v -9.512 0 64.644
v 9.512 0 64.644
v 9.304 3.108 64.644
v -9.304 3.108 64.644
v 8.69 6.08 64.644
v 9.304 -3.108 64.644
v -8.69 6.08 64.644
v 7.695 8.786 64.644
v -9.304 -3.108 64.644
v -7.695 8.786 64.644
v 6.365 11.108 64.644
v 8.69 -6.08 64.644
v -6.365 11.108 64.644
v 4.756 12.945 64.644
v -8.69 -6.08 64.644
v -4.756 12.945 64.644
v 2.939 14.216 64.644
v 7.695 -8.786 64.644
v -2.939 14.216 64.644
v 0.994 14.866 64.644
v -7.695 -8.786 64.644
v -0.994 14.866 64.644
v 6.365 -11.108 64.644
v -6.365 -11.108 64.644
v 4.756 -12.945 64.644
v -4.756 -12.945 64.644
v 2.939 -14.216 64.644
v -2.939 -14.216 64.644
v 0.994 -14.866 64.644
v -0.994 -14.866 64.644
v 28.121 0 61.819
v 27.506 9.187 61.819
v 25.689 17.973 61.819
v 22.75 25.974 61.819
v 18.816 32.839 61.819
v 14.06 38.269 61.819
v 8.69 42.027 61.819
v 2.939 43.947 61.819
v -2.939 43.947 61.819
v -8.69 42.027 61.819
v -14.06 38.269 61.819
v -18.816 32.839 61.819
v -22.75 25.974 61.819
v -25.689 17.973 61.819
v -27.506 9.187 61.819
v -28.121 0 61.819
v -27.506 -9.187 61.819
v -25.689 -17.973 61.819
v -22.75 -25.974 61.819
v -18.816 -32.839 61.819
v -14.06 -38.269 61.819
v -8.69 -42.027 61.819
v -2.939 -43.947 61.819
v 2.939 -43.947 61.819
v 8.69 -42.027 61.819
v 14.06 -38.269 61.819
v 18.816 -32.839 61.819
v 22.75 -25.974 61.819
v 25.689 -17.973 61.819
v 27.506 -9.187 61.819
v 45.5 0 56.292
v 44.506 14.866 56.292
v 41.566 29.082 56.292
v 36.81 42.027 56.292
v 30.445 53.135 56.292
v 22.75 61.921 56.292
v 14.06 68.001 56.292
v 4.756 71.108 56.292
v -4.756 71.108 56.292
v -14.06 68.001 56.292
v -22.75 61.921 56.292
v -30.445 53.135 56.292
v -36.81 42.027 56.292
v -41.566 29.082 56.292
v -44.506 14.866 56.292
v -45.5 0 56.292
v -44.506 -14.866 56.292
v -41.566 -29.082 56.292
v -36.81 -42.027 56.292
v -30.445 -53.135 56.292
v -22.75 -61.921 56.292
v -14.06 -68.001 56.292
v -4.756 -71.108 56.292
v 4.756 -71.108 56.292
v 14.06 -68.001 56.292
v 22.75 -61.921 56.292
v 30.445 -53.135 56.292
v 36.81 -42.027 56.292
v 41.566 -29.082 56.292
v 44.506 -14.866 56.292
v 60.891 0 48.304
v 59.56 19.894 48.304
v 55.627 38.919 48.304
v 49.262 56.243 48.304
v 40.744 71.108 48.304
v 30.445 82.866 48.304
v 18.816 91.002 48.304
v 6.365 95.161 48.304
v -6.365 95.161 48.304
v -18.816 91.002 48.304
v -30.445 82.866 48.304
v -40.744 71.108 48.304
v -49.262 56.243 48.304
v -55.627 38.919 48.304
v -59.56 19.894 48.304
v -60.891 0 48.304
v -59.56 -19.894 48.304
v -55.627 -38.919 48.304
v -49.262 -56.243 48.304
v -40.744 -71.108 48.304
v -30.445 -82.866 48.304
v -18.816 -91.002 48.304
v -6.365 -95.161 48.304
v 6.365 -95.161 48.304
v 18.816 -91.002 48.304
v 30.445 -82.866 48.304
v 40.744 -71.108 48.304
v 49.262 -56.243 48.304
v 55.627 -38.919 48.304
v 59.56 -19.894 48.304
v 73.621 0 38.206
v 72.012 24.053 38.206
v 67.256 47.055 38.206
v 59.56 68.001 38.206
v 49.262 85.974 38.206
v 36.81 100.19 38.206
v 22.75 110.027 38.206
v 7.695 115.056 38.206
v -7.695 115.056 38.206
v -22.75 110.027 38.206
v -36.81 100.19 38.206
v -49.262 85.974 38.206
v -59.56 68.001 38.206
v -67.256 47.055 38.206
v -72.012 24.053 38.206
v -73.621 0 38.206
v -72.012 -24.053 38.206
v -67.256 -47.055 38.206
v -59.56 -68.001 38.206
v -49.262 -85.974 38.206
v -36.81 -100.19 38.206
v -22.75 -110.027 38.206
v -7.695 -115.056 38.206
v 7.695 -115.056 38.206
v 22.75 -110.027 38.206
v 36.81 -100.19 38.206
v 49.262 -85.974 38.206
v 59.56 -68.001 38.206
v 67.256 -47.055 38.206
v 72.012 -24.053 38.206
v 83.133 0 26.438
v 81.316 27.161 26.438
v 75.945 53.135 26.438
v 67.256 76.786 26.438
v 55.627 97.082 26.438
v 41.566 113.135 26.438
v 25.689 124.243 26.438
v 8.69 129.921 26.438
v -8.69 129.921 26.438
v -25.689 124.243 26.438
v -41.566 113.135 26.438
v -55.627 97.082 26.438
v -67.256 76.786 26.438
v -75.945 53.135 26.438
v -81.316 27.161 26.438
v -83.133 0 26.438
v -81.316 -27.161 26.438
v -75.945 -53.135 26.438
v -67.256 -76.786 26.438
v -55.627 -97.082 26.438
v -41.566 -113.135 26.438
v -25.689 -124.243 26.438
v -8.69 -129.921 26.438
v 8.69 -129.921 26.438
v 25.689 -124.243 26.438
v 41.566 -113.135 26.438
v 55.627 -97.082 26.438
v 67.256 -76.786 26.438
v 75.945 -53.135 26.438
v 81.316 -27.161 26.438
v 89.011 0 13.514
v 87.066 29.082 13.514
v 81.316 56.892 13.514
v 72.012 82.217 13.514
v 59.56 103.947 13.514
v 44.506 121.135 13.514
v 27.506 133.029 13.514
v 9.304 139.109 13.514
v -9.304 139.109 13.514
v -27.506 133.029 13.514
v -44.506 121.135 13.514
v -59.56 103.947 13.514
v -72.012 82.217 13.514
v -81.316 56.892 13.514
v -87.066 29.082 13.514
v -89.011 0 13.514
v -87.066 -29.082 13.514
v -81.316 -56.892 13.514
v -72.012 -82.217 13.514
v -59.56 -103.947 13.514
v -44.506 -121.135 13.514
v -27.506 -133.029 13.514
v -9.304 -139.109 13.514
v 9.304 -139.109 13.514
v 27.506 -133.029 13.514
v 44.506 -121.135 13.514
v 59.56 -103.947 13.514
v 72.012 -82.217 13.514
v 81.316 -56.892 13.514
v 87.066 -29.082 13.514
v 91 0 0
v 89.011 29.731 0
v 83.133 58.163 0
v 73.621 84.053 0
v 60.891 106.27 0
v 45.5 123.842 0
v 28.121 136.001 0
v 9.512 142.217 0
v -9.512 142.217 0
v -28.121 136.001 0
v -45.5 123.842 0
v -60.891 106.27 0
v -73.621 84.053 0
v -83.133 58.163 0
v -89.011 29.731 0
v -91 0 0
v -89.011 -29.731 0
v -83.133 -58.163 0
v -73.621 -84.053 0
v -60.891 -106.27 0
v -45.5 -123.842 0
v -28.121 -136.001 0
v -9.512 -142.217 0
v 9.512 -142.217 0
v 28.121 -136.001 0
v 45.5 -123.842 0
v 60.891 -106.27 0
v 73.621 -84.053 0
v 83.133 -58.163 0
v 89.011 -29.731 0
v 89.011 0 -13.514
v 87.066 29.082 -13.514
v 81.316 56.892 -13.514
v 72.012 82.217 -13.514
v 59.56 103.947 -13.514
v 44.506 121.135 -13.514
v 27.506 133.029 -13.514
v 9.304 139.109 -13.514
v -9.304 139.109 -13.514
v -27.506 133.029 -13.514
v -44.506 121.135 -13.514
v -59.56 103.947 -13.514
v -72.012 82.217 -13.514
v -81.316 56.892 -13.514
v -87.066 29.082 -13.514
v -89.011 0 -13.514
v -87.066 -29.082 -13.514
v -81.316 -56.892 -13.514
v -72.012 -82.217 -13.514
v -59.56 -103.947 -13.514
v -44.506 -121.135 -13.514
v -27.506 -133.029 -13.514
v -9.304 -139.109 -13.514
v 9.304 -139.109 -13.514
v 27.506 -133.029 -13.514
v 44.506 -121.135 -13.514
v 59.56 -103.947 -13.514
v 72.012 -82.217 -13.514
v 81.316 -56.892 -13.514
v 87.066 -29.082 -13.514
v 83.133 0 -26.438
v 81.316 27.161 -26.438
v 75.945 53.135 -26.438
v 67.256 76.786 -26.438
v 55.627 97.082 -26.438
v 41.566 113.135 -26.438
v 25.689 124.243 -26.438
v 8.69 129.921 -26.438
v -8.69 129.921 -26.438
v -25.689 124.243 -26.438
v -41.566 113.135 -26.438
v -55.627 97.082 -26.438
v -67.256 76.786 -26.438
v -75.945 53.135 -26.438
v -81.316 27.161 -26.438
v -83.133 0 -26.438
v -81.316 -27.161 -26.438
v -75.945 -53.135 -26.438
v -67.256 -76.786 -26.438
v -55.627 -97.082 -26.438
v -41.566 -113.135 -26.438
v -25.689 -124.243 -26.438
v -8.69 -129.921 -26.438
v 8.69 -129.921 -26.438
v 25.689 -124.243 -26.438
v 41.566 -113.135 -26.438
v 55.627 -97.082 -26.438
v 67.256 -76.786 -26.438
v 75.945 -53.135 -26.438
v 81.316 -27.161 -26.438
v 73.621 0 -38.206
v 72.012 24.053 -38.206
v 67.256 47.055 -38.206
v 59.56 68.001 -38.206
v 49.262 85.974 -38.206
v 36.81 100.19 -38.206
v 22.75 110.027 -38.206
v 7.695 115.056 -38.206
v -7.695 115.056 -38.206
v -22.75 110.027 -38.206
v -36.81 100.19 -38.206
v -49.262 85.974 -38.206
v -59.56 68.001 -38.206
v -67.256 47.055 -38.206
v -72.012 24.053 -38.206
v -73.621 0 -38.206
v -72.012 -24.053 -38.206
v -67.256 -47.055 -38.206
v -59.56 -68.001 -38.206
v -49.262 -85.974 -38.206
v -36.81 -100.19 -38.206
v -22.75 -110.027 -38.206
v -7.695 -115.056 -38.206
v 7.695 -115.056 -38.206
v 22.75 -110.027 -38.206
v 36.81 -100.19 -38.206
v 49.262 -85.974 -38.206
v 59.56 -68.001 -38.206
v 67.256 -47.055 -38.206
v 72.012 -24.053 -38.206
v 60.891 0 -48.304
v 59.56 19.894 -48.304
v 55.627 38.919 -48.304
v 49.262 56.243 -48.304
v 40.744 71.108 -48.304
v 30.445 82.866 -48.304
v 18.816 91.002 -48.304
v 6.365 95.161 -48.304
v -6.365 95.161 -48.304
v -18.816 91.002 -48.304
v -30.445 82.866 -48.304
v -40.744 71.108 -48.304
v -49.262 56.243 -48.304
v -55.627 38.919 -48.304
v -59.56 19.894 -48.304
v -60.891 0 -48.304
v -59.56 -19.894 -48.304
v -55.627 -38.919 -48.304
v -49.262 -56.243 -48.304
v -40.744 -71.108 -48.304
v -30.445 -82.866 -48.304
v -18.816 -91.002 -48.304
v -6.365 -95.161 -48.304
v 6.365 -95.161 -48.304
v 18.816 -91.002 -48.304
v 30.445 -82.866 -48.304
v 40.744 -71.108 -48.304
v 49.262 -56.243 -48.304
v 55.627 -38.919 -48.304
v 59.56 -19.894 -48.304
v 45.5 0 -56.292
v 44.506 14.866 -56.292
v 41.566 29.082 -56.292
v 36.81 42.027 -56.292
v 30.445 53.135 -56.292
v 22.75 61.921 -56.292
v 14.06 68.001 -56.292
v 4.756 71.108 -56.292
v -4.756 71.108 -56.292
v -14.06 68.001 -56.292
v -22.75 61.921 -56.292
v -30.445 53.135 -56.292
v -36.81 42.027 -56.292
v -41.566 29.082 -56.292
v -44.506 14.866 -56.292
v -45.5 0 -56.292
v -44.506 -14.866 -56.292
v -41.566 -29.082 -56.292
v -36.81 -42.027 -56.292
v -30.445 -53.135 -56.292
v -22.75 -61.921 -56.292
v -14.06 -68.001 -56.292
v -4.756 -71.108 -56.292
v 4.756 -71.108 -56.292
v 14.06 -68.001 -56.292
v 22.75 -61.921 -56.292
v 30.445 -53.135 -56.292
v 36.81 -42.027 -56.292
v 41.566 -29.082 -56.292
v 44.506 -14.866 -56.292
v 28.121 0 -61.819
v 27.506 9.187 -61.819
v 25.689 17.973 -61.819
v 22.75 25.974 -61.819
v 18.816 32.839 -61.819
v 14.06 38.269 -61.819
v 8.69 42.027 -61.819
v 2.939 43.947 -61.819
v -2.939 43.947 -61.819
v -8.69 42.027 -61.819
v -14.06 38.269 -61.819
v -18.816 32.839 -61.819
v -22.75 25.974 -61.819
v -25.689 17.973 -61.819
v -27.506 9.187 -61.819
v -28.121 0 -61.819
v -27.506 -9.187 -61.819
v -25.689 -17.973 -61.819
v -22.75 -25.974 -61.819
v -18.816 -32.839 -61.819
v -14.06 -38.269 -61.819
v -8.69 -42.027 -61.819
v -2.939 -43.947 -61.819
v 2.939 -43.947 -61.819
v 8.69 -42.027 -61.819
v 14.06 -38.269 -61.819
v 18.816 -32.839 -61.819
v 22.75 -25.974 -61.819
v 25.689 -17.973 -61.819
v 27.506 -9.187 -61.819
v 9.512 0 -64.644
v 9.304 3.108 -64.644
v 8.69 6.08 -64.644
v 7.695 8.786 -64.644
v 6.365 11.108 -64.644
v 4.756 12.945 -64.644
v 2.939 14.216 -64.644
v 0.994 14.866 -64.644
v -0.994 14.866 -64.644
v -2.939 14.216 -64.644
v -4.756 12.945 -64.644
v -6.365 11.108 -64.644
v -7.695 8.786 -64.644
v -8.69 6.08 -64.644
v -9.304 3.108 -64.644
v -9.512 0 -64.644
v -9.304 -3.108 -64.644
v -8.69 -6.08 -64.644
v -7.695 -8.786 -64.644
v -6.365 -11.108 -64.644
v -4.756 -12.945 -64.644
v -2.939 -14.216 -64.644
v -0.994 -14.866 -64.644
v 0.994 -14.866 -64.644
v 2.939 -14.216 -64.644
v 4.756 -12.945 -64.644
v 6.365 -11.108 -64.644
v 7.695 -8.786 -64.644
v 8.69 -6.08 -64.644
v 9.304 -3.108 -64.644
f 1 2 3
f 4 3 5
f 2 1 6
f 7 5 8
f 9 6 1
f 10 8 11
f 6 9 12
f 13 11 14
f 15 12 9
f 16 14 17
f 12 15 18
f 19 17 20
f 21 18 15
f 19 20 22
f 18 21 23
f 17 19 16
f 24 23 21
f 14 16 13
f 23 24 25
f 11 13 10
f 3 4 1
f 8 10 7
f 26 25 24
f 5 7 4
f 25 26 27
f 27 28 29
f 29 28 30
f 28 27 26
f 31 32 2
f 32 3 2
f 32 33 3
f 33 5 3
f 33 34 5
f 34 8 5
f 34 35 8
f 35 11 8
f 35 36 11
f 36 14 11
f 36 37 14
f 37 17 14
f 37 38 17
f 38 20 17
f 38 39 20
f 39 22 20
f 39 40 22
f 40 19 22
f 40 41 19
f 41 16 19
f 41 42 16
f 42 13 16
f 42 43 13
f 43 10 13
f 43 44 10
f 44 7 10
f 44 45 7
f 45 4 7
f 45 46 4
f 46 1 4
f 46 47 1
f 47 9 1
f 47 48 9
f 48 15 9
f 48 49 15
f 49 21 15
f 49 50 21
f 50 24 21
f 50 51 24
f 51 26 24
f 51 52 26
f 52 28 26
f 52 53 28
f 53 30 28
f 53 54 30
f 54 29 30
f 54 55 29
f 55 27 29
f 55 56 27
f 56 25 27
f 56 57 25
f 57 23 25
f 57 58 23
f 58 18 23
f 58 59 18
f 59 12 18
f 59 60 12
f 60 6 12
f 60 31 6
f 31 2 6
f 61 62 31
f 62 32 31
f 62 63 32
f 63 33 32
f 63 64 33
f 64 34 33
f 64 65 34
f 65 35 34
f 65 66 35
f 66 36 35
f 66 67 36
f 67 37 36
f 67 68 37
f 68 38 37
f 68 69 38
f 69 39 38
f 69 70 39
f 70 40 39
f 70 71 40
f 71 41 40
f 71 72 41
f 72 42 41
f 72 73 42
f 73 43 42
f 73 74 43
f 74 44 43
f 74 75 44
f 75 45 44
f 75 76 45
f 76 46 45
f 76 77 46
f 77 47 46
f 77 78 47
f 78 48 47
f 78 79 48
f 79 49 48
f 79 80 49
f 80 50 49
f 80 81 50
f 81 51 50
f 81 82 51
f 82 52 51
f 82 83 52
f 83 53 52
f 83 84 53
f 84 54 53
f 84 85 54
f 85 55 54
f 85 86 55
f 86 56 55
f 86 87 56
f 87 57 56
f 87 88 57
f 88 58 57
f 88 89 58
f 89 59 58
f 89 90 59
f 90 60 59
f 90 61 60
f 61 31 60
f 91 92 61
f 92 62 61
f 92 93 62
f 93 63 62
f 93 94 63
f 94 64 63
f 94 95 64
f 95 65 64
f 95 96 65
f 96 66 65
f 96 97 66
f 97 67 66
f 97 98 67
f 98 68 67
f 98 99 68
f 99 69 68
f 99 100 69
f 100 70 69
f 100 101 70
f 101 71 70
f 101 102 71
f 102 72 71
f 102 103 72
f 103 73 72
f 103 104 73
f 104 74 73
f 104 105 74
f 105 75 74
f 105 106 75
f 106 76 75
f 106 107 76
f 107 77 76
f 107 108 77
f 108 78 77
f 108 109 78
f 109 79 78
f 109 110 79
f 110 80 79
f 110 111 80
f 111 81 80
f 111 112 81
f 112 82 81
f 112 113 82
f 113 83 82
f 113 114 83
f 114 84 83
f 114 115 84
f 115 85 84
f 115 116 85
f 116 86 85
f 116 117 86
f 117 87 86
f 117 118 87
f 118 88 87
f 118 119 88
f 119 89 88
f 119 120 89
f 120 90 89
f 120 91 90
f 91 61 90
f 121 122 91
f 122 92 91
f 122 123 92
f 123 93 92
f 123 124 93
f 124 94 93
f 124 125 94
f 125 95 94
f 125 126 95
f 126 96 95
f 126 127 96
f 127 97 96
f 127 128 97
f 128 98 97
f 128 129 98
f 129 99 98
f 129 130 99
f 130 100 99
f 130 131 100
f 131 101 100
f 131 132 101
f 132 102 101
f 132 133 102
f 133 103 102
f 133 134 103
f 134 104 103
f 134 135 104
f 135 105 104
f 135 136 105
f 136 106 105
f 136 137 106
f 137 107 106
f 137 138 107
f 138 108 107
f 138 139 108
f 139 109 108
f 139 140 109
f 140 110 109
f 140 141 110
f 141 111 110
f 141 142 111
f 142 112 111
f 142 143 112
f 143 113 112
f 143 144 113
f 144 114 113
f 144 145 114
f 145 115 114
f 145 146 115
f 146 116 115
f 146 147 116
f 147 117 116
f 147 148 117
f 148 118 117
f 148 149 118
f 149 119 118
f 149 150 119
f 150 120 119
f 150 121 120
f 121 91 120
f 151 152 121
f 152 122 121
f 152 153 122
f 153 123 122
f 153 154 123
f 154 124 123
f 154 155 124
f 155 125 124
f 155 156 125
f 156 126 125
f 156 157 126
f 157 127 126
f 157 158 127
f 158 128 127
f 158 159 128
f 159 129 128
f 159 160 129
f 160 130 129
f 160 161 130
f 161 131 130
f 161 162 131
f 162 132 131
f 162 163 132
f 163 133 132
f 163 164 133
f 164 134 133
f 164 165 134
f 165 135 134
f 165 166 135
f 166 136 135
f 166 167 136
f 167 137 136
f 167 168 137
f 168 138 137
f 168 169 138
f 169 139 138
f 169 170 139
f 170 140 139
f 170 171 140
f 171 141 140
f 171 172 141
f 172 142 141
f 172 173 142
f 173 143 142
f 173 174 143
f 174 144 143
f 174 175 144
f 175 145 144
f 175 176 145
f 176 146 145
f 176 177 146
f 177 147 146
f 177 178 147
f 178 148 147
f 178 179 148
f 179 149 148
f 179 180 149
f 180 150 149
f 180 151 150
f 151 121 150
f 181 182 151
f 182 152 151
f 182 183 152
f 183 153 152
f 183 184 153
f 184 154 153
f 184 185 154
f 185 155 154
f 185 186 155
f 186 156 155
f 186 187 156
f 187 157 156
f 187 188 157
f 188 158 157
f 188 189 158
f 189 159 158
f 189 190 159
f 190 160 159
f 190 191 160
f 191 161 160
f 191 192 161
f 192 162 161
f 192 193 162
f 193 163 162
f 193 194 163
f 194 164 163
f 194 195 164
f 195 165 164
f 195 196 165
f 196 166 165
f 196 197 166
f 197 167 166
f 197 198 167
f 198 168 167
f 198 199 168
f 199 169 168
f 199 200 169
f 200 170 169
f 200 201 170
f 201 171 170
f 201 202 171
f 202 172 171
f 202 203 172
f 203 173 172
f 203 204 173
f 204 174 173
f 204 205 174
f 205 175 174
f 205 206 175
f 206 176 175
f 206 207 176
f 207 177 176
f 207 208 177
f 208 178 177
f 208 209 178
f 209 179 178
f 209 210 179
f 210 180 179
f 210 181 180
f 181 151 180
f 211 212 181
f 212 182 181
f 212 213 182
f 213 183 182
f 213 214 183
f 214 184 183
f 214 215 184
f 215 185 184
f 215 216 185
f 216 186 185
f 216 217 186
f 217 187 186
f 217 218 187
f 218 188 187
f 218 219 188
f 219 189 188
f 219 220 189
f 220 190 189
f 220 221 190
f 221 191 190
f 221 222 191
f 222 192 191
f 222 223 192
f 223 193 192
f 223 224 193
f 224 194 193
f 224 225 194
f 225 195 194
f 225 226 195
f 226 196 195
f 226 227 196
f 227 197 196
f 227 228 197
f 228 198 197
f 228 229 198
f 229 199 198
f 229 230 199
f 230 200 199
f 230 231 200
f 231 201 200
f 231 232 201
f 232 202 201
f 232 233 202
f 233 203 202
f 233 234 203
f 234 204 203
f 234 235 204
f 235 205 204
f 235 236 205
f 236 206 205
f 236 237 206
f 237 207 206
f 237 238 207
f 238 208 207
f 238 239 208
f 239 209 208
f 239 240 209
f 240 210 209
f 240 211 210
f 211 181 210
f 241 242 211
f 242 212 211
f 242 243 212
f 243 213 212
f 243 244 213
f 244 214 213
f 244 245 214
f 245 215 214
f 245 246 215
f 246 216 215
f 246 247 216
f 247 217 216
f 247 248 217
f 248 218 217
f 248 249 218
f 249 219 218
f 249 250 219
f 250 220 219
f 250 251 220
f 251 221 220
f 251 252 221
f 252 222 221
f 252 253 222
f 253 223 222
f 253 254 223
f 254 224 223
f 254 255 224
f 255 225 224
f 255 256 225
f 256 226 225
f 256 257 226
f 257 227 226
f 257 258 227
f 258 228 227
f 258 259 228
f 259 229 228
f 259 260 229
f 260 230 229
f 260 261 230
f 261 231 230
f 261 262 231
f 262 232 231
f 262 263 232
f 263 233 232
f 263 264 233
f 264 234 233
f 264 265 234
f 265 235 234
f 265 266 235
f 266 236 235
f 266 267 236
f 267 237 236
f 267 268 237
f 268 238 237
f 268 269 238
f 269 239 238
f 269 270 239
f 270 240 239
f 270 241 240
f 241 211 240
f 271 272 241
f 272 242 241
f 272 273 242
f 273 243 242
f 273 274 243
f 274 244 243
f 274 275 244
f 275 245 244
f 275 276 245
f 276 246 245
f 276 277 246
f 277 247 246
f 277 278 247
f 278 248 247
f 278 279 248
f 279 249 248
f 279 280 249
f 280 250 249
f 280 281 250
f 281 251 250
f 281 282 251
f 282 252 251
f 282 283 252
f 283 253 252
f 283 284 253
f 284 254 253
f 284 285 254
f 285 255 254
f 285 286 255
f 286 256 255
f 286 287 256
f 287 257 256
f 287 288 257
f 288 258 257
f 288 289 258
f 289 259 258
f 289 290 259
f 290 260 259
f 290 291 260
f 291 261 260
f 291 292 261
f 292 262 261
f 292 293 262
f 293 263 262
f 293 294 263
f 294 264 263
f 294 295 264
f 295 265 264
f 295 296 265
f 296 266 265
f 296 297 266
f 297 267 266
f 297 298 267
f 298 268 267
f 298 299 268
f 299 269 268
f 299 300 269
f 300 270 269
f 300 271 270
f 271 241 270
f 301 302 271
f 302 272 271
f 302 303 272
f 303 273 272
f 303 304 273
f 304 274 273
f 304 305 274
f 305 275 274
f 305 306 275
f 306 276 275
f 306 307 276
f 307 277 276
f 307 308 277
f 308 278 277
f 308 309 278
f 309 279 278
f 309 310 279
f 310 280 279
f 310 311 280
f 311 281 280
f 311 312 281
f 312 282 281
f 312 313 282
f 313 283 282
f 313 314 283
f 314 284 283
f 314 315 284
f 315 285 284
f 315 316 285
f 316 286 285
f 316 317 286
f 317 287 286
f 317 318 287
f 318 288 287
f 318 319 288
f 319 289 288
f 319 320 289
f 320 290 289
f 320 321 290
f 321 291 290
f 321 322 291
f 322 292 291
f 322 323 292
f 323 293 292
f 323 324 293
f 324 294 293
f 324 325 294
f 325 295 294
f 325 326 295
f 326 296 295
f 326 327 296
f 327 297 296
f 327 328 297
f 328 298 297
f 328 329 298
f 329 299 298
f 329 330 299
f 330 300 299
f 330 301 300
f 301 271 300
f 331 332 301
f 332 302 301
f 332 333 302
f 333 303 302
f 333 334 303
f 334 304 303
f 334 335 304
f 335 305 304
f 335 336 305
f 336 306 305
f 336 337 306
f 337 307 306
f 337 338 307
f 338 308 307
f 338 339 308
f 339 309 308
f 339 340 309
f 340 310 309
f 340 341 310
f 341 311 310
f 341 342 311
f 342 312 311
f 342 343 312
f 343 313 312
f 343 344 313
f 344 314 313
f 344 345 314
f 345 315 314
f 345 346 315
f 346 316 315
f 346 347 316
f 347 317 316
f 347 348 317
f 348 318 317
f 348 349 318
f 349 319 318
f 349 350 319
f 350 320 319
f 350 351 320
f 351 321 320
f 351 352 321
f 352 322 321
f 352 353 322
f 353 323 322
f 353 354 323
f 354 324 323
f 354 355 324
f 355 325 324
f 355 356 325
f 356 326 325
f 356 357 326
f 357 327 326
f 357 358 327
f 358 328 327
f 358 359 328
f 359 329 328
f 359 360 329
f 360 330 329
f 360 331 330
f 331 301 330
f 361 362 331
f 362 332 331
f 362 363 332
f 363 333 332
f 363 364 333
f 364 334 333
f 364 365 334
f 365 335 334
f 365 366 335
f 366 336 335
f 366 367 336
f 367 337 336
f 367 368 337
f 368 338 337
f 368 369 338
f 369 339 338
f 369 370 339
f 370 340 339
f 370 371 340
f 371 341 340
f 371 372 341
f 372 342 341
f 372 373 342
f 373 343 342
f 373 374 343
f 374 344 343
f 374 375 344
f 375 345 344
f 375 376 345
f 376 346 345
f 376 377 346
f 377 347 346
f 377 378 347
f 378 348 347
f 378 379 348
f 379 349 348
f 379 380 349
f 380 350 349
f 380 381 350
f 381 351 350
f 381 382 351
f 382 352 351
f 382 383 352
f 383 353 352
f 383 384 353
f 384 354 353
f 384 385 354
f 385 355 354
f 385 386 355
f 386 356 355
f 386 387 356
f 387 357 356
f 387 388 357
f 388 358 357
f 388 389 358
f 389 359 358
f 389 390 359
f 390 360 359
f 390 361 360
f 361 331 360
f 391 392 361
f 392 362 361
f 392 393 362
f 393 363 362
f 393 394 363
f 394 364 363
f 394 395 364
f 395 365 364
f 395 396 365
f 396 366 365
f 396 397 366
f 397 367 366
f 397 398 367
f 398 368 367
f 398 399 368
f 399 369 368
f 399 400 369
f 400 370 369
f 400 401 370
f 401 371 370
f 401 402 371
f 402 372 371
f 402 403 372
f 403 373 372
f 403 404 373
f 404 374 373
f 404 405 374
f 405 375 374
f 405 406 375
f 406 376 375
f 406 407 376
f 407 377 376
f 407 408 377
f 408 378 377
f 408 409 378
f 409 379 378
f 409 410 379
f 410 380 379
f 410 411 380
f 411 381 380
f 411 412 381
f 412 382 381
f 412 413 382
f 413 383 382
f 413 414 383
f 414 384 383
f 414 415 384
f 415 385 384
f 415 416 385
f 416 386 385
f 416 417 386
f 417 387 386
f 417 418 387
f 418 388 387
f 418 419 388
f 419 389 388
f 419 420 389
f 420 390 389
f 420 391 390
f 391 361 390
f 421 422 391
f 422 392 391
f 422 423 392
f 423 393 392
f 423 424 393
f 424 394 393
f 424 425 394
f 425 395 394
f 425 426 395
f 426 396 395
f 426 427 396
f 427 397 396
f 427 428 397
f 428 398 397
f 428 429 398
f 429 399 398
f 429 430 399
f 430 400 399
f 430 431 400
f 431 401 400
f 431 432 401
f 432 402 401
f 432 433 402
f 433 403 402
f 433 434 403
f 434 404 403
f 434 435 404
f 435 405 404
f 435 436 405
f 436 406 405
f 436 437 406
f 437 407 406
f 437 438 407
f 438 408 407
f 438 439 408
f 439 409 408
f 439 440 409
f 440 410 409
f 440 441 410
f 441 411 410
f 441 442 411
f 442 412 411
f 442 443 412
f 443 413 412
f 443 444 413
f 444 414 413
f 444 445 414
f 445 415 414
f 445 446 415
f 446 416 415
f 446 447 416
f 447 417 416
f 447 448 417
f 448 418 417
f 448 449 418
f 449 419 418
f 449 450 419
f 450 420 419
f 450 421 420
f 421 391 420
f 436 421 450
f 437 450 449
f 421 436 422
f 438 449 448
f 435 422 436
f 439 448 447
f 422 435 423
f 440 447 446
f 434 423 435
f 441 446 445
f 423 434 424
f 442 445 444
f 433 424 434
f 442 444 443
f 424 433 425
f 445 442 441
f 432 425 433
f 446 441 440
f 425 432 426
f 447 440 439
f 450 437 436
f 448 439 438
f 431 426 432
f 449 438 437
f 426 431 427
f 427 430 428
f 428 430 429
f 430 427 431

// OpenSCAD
// Generated by SolidPython 1.0.1 on 2020-07-29 00:46:47


scale(v = [7, 11, 5]) {
	sphere(r = 13);
}
/***********************************************
*********      SolidPython code:      **********
************************************************
 
# import packages: SolidPython
from solid import *
from solid.utils import *
from itertools import chain, combinations, permutations


class Resize:

    def __init__(self, scad_file):
        self.scad_file = scad_file
        #self.scad_file = import_scad(scad_file)
        # cone/cylinder param:
        self.r1 = 0
        self.r2 = 0
        self.h = 0
        # rectangular prism param:
        self.w = 0
        self.l = 0
        # ellipse param:
        self.r = 0

    # import OpenScad code (file name corresponds to shape)


    # classify shape + parameters
    def assign(self, param1, param2, param3):
        if self.scad_file == 'cone.scad':
            self.r1 = param1
            self.r2 = param2
            self.h = param3
        elif self.scad_file == 'cylinder.scad':
            self.r1 = param1
            self.r2 = param2
            self.h = param3
        elif self.scad_file == 'rectangularPrism.scad':
            self.h = param1
            self.l = param2
            self.w = param3
        else:
            self.r = param1
            self.h = param2

    # resize parameters
    def iterate(self):
        x = range(3, 20, 2)
        i = 1
        if self.scad_file == 'cone.scad':
            tempList = list(permutations(x, 2))
            for temp in tempList:
                param1 = temp[0]
                param2 = temp[1]
                filepath = 'produced_scad_files/' + 'cone' + str(param1) + '_' + str(param2) + '_' + '.scad'
                scad_render_to_file(cylinder(h=param1, r1=param2, r2=0), filepath)

        elif self.scad_file == 'cylinder.scad':
            tempList = list(permutations(x, 3))
            for temp in tempList:
                param1 = temp[0]
                param2 = temp[1]
                filepath = 'produced_scad_files/' + 'cylinder' + str(param1) + '_' + str(param2) + '_' + '.scad'
                scad_render_to_file(cylinder(h=param1, r1=param2, r2=param2), filepath)

        elif self.scad_file == 'rectangularPrism.scad':
            tempList = list(permutations(x, 3))
            for temp in tempList:
                param1 = temp[0]
                param2 = temp[1]
                param3 = temp[2]
                filepath = 'produced_scad_files/' + 'rectangularPrism' + str(param1) + '_' + str(param2) + '_' + str(
                    param3) + '.scad'
                scad_render_to_file(cube(size=(param1, param2, param3)), filepath)

        elif self.scad_file == 'ellipse.scad':
            tempList = list(permutations(x, 4))
            for temp in tempList:
                param1 = temp[0]
                param2 = temp[1]
                param3 = temp[2]
                param4 = temp[3]
                filepath = 'produced_scad_files/' + 'ellipse' + str(param1) + '_' + str(param2) + '_' + str(param3) + '_' + str(param4) + '.scad'
                scad_render_to_file(scale([param1, param2, param3])(sphere(r=param4)), filepath)

    def render_to_scadfile(self):
        scad_render_to_file(scad, 'example.scad') 
 
************************************************/
